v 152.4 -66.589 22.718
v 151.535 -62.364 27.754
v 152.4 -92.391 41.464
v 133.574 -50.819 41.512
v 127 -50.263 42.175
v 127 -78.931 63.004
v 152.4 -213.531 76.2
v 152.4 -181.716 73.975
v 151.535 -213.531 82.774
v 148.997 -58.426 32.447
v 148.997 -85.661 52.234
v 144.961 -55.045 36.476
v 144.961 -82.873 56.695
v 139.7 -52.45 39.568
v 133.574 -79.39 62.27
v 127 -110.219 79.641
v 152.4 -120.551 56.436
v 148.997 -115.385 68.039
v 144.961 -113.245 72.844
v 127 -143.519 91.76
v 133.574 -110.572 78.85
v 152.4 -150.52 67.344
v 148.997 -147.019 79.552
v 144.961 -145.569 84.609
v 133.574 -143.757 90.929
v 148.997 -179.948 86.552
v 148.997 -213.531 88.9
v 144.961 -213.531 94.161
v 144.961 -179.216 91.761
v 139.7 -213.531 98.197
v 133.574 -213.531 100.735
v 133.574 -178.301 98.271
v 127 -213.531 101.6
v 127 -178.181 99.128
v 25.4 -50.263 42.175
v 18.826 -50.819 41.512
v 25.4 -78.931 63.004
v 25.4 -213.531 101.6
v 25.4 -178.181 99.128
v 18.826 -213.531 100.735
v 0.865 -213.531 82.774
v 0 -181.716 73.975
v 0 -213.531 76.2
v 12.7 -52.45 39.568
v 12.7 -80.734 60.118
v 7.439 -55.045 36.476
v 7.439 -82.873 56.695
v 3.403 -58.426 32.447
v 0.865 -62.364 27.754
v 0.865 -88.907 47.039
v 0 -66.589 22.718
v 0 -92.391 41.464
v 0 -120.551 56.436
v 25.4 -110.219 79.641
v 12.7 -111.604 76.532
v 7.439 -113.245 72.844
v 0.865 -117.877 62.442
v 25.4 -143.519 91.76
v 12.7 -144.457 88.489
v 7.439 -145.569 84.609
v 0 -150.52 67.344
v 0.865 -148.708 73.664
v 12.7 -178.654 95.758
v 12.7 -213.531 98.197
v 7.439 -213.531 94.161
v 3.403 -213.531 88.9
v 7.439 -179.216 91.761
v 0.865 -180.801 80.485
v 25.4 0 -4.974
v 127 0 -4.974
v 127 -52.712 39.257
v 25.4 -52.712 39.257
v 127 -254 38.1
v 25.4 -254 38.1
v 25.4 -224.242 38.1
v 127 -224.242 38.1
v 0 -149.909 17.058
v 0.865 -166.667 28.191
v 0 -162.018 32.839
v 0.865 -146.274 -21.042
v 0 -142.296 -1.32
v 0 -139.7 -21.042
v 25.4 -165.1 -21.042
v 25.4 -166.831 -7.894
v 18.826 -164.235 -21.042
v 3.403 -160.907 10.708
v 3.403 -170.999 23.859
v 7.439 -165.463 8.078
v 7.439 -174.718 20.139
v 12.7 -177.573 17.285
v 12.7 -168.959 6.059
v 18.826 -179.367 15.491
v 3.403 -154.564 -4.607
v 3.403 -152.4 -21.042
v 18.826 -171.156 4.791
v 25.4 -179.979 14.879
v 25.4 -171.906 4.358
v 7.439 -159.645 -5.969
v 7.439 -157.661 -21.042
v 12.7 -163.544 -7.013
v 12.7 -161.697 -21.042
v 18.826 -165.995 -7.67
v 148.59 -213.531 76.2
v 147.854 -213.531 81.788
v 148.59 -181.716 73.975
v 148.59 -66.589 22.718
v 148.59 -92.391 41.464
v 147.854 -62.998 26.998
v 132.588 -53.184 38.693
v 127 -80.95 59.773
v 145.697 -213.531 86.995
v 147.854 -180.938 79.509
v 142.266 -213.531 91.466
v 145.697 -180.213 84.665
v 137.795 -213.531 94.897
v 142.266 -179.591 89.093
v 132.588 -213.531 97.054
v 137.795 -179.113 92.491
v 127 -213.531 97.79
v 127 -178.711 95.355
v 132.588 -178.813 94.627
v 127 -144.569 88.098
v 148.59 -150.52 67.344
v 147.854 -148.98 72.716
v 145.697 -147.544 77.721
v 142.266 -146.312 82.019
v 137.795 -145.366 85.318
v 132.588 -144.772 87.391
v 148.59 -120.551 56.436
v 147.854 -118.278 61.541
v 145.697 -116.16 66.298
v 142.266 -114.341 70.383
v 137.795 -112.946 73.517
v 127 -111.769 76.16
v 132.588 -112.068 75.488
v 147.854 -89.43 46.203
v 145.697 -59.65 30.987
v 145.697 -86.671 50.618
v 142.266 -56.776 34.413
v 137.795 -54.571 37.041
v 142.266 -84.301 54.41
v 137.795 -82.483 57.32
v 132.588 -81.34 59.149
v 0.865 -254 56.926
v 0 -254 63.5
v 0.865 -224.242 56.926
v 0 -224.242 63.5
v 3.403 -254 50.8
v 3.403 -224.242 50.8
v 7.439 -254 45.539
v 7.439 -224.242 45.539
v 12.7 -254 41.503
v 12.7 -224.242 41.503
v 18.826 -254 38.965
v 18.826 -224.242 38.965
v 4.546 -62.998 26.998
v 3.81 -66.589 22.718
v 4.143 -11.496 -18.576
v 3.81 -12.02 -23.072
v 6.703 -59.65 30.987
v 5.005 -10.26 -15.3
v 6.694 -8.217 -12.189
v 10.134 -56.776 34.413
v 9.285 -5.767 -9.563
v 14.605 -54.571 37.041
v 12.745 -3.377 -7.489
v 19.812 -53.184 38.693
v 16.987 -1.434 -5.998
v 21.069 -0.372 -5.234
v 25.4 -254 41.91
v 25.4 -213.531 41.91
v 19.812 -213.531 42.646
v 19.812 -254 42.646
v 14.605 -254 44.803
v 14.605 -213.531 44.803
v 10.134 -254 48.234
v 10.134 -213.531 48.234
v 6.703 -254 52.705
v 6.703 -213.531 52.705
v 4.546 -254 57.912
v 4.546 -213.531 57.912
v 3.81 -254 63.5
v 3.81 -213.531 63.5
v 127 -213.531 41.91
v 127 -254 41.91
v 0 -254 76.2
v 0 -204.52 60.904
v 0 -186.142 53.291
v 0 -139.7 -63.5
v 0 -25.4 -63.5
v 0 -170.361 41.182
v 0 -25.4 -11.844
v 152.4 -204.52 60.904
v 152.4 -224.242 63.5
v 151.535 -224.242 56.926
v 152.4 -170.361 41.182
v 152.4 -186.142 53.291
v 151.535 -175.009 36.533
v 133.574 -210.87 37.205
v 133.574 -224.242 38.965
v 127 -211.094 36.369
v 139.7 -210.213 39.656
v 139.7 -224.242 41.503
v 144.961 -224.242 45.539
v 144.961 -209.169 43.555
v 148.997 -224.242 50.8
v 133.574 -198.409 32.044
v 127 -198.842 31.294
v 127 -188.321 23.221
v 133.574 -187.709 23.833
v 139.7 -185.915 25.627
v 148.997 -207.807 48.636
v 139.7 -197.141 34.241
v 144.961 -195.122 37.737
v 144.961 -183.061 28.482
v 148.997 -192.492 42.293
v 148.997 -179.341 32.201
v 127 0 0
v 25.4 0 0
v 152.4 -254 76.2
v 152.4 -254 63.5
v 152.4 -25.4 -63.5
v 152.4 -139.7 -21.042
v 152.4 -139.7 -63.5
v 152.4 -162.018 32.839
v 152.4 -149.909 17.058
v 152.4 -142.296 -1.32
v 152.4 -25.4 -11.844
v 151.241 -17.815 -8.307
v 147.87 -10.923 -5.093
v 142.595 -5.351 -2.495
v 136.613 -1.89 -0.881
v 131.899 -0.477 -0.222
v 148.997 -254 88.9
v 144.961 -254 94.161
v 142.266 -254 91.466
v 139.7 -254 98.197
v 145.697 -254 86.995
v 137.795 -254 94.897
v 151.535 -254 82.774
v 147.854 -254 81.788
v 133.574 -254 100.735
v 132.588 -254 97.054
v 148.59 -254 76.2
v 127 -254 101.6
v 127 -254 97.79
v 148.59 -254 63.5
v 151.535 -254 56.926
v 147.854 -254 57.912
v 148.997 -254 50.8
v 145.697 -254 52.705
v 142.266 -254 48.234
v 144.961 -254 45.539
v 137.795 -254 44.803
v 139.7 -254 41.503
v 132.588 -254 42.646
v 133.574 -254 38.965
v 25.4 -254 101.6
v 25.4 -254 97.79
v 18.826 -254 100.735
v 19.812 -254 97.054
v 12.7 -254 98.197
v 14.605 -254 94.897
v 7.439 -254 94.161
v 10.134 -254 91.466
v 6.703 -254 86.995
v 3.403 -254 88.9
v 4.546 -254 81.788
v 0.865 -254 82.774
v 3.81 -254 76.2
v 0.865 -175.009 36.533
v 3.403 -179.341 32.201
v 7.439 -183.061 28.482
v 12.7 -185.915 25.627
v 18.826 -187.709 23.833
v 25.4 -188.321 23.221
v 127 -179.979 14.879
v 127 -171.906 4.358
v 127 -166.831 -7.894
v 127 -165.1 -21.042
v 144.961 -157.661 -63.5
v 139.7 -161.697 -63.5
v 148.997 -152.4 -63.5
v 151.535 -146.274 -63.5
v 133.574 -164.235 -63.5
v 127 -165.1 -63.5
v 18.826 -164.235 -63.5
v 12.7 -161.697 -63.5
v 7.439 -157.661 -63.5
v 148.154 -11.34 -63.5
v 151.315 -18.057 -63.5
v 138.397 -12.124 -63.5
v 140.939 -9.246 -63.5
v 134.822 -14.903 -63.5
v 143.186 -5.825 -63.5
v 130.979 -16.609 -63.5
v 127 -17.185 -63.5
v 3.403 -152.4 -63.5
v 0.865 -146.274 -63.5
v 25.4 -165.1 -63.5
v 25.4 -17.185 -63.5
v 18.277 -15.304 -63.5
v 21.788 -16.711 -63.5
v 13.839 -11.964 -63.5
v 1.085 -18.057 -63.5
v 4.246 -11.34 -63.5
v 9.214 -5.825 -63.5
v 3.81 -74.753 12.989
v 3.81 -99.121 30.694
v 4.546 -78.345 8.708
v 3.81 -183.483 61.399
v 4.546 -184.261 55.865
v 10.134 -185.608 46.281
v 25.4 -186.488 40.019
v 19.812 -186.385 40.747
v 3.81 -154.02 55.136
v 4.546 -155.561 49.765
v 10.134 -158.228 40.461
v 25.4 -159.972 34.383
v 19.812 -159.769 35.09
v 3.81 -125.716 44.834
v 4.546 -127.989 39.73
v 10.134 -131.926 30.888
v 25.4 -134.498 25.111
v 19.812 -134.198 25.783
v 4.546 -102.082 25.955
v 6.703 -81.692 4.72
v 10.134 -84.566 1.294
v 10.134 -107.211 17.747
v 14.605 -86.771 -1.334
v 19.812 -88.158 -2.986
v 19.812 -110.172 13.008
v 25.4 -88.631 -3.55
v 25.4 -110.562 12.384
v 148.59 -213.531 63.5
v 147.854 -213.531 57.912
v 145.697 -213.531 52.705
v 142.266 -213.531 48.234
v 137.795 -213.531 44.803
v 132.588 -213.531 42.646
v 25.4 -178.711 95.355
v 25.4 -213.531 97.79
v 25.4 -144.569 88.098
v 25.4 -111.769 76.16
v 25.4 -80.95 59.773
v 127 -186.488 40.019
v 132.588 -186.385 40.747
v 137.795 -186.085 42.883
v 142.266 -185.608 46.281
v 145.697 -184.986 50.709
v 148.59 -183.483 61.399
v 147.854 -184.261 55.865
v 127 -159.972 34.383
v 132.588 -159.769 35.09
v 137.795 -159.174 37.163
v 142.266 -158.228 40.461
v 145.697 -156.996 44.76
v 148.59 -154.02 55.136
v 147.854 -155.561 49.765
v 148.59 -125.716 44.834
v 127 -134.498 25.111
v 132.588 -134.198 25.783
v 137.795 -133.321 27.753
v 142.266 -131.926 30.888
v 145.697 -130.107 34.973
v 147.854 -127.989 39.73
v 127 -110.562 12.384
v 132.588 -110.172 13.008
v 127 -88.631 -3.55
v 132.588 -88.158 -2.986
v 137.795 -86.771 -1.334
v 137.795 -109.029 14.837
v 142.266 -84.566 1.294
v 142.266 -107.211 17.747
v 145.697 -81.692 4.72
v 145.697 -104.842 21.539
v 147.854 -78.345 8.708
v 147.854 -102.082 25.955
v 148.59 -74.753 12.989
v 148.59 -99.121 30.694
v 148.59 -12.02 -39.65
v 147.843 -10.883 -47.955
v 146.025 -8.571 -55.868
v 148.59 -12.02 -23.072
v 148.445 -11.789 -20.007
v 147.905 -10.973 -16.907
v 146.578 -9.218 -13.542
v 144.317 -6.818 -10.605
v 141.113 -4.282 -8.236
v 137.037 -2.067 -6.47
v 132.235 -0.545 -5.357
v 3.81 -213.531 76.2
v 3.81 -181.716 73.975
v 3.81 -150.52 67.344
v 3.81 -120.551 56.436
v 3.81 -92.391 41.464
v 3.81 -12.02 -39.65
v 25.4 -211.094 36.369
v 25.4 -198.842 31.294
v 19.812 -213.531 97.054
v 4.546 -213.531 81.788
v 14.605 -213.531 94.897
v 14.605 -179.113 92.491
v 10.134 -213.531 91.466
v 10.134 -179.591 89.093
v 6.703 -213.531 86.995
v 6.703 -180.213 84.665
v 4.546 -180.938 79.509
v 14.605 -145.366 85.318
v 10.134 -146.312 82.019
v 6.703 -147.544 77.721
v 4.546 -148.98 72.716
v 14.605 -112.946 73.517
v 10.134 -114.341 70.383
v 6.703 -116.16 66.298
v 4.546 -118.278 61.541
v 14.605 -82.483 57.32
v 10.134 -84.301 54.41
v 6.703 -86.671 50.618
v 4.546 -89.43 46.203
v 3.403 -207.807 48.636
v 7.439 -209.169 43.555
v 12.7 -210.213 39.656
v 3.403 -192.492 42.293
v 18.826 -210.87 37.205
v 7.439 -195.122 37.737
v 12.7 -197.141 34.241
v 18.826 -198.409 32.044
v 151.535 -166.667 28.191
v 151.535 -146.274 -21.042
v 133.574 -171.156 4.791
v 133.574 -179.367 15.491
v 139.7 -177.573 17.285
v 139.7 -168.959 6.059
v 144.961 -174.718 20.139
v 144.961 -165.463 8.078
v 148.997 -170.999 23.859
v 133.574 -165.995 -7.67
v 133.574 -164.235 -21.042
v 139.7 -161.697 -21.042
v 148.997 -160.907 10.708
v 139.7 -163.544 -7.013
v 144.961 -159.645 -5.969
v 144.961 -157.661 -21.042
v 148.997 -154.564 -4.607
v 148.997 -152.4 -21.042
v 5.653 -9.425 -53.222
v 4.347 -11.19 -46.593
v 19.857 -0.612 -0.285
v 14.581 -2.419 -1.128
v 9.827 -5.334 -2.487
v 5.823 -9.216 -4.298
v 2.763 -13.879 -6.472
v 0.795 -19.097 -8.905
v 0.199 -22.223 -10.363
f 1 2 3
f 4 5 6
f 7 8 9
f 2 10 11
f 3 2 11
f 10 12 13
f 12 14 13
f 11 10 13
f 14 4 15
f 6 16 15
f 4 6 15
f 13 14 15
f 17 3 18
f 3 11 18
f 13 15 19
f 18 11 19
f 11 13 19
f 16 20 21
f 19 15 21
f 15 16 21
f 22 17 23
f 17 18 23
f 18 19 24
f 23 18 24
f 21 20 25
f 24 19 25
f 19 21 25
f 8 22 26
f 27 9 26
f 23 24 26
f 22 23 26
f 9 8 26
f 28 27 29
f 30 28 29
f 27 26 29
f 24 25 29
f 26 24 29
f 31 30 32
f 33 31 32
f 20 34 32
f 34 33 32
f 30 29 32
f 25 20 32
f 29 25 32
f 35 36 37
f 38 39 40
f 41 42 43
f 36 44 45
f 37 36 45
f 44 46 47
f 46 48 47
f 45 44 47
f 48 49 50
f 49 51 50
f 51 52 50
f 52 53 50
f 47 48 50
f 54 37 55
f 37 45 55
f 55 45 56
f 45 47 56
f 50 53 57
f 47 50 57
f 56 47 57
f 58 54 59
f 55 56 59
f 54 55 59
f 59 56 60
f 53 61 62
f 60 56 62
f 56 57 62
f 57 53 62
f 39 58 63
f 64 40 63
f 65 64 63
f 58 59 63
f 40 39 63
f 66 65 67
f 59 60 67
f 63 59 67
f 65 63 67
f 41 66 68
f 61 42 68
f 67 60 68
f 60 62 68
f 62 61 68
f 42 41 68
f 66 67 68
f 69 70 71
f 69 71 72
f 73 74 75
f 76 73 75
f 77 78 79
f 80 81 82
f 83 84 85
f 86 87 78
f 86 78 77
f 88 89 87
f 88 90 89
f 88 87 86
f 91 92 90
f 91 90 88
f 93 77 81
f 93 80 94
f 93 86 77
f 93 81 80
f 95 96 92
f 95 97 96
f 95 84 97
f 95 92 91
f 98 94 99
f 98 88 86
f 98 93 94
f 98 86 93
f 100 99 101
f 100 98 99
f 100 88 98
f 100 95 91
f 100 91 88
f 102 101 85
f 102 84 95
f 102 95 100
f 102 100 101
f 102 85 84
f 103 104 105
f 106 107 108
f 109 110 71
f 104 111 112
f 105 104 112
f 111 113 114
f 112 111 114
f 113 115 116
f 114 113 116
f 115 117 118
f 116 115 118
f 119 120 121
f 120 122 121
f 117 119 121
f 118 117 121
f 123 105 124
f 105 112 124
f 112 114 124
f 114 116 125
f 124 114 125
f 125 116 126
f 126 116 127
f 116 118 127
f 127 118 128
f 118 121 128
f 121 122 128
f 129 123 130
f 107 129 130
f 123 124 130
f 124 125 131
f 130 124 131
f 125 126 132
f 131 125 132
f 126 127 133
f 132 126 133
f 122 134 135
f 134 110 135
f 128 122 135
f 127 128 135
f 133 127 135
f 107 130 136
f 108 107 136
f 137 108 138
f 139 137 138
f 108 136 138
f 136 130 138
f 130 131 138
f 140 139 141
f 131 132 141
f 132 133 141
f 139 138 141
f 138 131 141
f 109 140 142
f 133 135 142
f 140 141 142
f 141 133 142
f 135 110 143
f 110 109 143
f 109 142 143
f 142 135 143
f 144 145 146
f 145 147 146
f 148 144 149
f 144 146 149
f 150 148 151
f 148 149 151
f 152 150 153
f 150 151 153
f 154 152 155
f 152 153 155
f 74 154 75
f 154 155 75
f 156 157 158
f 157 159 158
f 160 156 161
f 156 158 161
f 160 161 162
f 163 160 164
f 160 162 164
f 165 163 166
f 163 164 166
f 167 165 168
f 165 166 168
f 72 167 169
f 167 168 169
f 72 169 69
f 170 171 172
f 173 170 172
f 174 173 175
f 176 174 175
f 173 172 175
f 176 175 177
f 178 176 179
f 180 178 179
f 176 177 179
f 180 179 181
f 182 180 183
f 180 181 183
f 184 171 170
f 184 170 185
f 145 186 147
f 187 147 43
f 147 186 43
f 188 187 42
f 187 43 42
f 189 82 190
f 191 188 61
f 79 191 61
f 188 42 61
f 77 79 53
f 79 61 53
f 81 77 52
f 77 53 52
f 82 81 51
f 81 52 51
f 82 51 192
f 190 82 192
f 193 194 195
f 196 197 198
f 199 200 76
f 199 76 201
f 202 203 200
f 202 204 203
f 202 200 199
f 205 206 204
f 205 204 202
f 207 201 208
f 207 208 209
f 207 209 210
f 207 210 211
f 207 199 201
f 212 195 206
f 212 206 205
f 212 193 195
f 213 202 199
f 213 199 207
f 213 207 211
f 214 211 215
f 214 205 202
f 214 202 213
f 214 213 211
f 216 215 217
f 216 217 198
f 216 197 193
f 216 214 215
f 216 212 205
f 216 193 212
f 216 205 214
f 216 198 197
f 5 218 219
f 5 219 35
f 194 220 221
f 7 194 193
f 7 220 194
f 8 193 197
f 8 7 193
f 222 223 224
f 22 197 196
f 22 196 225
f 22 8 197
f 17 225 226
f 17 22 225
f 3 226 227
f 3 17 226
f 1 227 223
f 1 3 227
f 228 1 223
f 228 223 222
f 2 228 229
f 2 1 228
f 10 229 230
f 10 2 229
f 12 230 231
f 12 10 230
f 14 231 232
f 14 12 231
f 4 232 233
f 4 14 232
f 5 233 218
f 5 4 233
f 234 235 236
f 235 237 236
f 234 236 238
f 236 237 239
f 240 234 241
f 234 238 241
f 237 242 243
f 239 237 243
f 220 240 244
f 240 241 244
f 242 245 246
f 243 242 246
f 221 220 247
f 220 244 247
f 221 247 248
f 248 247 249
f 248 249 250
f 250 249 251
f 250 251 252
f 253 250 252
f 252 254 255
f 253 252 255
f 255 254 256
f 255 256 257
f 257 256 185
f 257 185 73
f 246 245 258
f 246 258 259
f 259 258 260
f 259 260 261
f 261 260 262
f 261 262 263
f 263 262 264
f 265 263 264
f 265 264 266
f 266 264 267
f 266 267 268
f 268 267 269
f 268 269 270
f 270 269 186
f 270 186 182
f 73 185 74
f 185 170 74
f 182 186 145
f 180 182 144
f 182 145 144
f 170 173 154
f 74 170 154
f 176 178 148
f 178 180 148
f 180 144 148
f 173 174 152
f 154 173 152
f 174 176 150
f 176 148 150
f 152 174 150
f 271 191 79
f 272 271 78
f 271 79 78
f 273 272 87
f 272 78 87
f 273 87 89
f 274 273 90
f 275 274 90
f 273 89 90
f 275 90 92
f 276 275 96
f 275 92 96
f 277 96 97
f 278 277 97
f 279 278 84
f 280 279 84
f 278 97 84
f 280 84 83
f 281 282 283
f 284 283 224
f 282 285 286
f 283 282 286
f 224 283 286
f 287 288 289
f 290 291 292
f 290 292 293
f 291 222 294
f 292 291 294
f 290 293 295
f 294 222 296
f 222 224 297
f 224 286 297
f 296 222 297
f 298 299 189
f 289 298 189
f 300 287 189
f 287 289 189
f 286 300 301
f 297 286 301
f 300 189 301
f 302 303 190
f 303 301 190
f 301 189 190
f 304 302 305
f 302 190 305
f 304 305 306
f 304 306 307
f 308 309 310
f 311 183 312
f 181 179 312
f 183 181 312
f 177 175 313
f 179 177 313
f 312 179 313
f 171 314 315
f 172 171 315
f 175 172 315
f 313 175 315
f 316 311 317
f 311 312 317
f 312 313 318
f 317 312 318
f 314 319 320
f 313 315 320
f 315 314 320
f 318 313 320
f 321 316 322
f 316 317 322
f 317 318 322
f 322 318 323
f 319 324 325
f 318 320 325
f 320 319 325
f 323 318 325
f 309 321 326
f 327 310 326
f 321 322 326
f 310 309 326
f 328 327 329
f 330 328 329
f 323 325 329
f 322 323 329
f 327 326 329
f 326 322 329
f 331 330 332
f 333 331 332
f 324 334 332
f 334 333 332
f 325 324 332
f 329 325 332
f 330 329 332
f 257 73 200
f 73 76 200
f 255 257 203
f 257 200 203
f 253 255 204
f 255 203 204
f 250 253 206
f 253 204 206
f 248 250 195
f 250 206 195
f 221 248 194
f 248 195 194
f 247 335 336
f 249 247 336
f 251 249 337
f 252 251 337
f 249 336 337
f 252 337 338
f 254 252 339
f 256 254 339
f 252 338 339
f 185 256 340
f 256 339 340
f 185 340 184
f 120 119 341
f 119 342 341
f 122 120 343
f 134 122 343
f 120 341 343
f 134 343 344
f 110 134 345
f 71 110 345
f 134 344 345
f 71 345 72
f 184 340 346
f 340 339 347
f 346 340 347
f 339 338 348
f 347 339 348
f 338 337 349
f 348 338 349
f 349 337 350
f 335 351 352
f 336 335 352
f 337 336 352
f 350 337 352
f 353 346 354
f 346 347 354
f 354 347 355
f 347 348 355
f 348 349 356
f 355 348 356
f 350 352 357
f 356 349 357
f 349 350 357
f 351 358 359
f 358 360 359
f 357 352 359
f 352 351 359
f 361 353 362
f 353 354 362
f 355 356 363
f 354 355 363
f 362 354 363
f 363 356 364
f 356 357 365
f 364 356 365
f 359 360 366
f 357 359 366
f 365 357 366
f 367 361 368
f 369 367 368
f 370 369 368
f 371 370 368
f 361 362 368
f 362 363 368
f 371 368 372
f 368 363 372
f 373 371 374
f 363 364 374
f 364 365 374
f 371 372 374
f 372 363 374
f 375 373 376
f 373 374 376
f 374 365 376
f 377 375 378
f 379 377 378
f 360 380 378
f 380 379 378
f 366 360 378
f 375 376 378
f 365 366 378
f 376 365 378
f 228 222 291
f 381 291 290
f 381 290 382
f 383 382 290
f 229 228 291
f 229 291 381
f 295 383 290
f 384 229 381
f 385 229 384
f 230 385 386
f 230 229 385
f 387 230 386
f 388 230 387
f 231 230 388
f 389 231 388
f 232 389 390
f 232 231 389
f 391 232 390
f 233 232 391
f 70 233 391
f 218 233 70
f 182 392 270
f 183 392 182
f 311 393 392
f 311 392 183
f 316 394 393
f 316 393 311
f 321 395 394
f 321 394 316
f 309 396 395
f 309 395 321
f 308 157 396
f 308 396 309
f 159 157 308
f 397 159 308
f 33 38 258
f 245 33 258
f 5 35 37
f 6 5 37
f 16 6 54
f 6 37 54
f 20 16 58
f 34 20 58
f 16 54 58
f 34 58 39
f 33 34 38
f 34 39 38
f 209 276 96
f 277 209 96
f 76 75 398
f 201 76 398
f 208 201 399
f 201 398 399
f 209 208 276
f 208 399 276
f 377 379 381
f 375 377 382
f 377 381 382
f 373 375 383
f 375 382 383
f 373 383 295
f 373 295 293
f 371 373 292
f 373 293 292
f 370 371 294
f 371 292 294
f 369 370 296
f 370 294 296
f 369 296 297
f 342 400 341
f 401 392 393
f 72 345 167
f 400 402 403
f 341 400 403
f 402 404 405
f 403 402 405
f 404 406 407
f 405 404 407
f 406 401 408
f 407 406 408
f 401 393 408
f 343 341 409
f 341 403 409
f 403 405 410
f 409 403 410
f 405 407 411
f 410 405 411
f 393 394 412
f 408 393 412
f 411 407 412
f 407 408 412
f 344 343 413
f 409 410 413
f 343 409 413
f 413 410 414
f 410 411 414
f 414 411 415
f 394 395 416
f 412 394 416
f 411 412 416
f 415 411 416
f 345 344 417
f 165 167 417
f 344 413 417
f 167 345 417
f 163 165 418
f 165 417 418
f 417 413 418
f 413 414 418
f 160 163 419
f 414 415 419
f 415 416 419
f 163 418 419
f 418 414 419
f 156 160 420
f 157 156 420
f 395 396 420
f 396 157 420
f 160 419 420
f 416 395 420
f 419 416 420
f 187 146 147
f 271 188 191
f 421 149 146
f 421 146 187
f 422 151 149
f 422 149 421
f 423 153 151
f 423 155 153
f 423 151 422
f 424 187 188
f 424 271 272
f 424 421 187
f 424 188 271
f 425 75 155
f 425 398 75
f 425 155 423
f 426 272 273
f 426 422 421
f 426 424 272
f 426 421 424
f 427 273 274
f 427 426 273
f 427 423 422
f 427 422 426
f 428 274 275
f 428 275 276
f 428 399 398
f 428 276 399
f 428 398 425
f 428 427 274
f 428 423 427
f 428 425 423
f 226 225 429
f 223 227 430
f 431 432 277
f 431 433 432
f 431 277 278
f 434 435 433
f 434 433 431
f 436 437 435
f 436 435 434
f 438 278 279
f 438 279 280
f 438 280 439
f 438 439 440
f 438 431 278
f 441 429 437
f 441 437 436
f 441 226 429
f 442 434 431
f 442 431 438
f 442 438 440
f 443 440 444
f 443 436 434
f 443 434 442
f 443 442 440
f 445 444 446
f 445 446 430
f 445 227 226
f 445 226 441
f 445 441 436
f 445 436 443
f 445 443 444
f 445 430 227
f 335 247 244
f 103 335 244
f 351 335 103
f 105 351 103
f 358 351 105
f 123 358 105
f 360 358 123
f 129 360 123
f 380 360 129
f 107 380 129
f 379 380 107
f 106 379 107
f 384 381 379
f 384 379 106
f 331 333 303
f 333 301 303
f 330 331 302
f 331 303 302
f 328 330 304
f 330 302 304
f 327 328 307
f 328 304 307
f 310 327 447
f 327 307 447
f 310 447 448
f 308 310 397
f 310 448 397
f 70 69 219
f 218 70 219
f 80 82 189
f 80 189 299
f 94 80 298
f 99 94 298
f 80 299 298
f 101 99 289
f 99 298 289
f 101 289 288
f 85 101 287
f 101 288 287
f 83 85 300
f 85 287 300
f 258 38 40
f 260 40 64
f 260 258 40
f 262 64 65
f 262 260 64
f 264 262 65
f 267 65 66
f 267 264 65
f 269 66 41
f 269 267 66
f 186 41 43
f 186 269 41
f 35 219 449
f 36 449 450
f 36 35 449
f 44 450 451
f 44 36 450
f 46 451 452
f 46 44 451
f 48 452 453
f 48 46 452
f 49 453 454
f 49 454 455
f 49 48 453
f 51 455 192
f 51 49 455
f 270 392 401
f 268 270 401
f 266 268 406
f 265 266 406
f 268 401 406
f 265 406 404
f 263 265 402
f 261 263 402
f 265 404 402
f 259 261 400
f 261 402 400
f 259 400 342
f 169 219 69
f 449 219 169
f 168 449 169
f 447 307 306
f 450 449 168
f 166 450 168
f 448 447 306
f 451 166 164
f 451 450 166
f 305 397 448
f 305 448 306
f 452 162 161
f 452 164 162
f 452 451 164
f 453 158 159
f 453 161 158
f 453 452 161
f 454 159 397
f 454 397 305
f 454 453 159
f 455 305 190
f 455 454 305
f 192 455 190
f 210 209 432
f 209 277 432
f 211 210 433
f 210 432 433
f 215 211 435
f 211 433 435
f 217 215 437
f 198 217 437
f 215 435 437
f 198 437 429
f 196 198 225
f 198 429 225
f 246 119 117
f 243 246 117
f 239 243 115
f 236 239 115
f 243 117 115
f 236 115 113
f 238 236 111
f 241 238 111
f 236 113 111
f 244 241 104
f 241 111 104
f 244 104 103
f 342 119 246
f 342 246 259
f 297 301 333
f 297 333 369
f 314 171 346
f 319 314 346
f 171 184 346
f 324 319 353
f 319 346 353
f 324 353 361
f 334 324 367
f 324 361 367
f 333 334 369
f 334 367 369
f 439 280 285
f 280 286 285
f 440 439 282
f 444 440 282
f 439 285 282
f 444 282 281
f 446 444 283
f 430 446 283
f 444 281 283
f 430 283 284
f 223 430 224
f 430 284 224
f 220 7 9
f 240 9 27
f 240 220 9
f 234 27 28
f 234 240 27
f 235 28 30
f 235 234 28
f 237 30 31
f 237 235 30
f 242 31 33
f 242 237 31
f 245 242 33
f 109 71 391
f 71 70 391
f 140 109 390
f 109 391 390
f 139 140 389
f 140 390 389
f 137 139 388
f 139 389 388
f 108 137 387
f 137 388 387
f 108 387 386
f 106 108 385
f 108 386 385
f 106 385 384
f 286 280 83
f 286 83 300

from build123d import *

# Parameters (mm, degrees)
F1_DEPTH = 152.4
F2_R     = 25.4
F3_R     = 25.4
F4_R     = 25.4
F5_R     = 25.4


# Not quite as in the source:
# - a feature names something its author has since deleted; it is built from what else it names


with BuildPart() as f1:
    # F0 (on Right) → F1 (new body)
    with BuildSketch(Plane.YZ):
        with BuildLine():
            Line((0, -63.5), (0, 0))
            Line((0, 0), (-50.2625516508, 42.1752885522))
            ThreePointArc((-50.2625516508, 42.1752885522), (-126.6574881065, 86.2819256796), (-213.5306045112, 101.6))
            Line((-213.5306045112, 101.6), (-254, 101.6))
            Line((-254, 101.6), (-254, 38.1))
            Line((-254, 38.1), (-224.2420489686, 38.1))
            ThreePointArc((-224.2420489686, 38.1), (-204.8017306044, 34.2330802516), (-188.3210244843, 23.2210244843))
            Line((-188.3210244843, 23.2210244843), (-179.9789755157, 14.8789755157))
            ThreePointArc((-179.9789755157, 14.8789755157), (-168.9669197484, -1.6017306044), (-165.1, -21.0420489686))
            Line((-165.1, -21.0420489686), (-165.1, -63.5))
            Line((-165.1, -63.5), (0, -63.5))
        make_face()
    extrude(amount=F1_DEPTH)

    # F2
    f2_edges = [f1.edges().sort_by_distance(p)[0] for p in [
        (0, -233.765302, 101.6),
        (0, 0, -31.75),
    ]]
    fillet(f2_edges, radius=F2_R)

    # F3
    f3_edges = [f1.edges().sort_by_distance(p)[0] for p in [
        (0, -165.1, -42.271024),
    ]]
    fillet(f3_edges, radius=F3_R)

    # F4
    f4_edges = [f1.edges().sort_by_distance(p)[0] for p in [
        (152.4, -165.1, -42.271024),
    ]]
    fillet(f4_edges, radius=F4_R)

    # F5
    f5_edges = [f1.edges().sort_by_distance(p)[0] for p in [
        (152.4, -233.765302, 101.6),
        (152.4, 0, -31.75),
    ]]
    fillet(f5_edges, radius=F5_R)

    # F9: sweep along a path in F8
    with BuildLine(Plane.YZ.offset(76.2)) as f9_path:
        Line((-254, 69.85), (-213.5306045112, 69.85))
        ThreePointArc((-213.5306045112, 69.85), (-137.5166276571, 56.4466849697), (-70.6710582584, 17.8533774832))
        Line((-70.6710582584, 17.8533774832), (74.6758873088, -104.1071909349))
    # F6 (on face) → F9 (sweep, cut)
    with BuildSketch(Plane.XZ.offset(254)):
        with BuildLine():
            Line((25.4, 41.91), (127, 41.91))
            ThreePointArc((127, 41.91), (142.2664354058, 48.2335645942), (148.59, 63.5))
            Line((148.59, 63.5), (148.59, 76.2))
            ThreePointArc((148.59, 76.2), (142.2664354058, 91.4664354058), (127, 97.79))
            Line((127, 97.79), (25.4, 97.79))
            ThreePointArc((25.4, 97.79), (10.1335645942, 91.4664354058), (3.81, 76.2))
            Line((3.81, 76.2), (3.81, 63.5))
            ThreePointArc((3.81, 63.5), (10.1335645942, 48.2335645942), (25.4, 41.91))
        make_face()
    sweep(path=f9_path.line, mode=Mode.SUBTRACT)


solid = f1.part
